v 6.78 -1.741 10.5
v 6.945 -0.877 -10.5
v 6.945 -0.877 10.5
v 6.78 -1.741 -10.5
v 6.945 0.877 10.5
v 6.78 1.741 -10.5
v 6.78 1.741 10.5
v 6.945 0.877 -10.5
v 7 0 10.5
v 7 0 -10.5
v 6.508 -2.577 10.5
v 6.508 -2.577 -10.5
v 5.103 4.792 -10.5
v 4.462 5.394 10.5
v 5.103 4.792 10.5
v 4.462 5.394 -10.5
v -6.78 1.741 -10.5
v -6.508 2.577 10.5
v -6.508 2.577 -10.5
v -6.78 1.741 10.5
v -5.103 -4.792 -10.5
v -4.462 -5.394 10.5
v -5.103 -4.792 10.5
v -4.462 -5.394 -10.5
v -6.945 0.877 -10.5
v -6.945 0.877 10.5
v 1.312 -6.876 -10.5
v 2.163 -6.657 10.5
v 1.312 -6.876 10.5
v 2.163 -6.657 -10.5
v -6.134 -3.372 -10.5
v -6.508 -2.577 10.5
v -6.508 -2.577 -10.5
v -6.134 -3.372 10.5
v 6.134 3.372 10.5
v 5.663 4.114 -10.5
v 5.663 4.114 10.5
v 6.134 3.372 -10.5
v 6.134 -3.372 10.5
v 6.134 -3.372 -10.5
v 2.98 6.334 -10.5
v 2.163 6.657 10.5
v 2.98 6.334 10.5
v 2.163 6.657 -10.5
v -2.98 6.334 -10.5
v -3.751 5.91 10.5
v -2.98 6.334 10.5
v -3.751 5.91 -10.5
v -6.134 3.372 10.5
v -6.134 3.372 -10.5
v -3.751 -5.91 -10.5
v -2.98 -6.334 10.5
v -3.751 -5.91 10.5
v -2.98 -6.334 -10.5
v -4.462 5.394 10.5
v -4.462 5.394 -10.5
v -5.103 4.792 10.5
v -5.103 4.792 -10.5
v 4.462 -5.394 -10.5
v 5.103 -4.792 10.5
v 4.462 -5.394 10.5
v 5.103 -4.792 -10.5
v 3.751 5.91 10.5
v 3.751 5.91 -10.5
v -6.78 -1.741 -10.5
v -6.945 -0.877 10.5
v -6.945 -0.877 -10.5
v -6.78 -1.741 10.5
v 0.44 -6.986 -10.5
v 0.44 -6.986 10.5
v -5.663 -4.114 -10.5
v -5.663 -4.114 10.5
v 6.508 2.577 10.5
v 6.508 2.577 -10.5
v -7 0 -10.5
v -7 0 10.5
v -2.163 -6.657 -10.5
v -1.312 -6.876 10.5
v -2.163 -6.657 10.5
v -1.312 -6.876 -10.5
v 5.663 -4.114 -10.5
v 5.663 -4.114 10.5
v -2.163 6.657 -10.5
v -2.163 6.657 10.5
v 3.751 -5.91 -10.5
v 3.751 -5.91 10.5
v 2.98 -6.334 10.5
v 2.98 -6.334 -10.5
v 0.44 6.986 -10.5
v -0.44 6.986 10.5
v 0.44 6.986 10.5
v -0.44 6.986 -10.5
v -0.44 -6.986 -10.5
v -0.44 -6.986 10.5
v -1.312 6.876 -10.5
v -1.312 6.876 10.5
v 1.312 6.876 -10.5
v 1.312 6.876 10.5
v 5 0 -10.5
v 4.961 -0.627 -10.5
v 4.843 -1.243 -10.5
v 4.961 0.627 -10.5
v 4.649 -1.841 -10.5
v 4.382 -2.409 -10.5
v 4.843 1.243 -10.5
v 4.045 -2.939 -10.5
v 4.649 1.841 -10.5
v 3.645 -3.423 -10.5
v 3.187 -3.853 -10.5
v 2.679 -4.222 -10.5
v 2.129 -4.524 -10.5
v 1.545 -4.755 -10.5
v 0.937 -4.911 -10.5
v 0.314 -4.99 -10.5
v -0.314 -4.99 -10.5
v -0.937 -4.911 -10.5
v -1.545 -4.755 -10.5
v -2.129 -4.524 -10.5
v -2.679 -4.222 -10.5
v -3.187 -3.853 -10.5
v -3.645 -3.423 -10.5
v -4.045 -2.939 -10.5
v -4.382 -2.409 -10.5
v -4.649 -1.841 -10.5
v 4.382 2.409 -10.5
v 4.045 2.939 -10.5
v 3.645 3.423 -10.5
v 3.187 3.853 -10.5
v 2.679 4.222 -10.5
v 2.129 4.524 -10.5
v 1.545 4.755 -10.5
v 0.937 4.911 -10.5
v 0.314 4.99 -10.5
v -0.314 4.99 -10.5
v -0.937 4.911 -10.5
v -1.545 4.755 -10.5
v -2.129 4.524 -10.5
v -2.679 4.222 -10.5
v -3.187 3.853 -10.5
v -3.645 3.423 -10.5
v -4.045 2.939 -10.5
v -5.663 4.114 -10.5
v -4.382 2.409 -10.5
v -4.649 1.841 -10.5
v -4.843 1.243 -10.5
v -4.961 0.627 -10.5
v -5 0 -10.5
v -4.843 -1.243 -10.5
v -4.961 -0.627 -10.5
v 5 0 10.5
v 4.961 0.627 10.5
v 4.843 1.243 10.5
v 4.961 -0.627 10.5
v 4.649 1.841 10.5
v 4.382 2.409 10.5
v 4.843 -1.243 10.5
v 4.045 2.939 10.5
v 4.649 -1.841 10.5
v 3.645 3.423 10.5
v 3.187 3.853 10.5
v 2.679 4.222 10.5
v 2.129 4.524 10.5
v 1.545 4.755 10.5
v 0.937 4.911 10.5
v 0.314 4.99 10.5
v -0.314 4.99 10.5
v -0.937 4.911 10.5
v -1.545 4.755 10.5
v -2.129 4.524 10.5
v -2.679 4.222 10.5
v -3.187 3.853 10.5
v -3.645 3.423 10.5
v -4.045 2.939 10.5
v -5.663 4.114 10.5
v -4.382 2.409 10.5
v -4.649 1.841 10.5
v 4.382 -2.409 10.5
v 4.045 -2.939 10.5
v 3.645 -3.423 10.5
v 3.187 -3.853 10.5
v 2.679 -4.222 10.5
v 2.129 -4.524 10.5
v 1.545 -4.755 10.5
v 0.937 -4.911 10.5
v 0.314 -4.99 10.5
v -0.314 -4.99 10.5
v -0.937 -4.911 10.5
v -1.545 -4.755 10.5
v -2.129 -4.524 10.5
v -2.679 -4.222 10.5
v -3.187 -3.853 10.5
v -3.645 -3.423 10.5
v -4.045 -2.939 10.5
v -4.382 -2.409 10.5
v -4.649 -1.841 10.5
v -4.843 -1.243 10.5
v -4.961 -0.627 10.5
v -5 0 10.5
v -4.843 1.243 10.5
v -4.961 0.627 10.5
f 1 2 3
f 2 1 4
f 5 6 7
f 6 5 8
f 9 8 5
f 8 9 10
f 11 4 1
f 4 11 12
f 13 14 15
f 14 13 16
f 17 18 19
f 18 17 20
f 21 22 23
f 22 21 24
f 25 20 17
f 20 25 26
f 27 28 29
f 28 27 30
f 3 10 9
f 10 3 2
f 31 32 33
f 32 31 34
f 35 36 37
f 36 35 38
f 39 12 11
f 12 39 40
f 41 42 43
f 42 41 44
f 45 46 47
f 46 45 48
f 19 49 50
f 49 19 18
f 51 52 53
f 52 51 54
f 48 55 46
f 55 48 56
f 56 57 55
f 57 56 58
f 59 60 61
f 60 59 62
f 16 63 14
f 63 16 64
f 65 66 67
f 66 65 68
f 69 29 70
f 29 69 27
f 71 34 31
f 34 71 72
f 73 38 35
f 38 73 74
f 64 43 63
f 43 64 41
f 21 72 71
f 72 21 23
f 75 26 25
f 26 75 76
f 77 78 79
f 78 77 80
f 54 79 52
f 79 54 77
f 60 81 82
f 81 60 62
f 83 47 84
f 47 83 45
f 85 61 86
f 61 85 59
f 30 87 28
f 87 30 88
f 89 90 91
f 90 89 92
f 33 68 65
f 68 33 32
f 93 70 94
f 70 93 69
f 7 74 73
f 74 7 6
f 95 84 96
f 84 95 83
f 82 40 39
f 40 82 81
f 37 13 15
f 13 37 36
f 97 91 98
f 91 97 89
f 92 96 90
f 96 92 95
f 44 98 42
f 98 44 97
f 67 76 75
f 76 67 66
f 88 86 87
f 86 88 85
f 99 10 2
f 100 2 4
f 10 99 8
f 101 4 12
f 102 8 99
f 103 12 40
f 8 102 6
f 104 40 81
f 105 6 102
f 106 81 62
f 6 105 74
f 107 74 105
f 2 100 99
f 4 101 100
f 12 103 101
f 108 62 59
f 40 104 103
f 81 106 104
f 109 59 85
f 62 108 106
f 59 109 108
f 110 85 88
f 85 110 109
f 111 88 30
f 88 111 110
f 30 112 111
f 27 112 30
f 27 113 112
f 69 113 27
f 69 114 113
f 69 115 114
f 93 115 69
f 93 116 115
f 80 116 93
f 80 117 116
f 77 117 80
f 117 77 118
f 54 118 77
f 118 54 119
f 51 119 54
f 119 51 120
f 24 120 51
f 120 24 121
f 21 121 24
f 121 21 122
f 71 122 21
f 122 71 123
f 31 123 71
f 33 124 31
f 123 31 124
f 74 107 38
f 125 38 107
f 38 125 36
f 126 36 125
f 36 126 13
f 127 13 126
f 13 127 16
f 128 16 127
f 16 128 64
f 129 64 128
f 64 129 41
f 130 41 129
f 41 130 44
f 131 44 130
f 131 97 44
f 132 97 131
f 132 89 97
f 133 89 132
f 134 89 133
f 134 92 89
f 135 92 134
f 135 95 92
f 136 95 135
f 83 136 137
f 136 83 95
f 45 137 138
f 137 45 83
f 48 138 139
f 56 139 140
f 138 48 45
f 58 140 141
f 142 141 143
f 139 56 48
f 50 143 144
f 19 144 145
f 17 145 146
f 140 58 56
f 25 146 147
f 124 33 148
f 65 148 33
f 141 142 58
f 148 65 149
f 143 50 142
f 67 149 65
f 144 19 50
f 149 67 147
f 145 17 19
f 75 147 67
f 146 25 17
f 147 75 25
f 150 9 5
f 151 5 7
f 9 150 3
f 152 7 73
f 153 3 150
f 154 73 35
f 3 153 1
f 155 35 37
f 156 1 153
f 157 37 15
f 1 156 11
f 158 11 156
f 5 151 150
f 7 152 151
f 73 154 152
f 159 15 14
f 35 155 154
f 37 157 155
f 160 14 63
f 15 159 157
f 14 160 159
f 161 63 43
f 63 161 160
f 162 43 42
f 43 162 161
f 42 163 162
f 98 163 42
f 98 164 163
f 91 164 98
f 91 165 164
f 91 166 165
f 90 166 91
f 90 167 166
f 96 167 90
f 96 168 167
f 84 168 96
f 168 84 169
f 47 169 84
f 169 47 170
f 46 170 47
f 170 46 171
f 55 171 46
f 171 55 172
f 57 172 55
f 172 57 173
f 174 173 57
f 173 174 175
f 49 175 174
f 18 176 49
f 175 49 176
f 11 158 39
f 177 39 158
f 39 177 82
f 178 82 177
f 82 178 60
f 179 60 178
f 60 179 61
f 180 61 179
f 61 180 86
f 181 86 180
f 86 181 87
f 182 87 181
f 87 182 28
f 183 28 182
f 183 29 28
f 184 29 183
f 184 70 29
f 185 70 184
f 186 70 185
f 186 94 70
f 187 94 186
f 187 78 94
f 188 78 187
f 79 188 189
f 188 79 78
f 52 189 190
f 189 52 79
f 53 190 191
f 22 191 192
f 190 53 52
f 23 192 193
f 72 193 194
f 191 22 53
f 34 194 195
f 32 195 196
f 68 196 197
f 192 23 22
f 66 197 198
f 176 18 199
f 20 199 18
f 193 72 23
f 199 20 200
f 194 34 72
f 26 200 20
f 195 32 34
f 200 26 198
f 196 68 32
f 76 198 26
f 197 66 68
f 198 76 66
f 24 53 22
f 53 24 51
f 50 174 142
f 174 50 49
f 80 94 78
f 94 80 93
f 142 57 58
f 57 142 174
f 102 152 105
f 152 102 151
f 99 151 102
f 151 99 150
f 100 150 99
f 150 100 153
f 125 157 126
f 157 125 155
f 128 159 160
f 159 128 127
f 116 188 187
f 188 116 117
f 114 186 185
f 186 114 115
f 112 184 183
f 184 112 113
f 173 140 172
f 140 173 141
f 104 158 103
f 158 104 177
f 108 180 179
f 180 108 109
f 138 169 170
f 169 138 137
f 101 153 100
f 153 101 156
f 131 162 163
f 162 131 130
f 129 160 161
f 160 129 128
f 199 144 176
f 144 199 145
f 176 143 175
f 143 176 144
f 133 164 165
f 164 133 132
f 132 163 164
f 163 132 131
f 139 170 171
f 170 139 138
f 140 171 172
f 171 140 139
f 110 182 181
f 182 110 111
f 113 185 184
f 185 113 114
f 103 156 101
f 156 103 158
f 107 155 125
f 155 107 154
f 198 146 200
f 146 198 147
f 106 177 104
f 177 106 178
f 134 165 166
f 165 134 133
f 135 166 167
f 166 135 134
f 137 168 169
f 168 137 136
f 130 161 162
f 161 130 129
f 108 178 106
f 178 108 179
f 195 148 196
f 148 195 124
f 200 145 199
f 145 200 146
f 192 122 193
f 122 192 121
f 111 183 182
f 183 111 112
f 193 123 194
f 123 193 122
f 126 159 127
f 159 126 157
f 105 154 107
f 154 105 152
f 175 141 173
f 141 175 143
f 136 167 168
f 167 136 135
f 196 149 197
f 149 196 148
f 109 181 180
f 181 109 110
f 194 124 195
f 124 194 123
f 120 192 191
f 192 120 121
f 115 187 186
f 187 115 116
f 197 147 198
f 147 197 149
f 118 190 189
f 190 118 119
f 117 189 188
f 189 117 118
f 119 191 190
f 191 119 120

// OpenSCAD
$fn = 50;


difference() {
	union() {
		translate(v = [0, 0, -10.5000000000]) {
			cylinder(h = 21, r = 7.0000000000);
		}
	}
	union() {
		translate(v = [0, 0, -100.0000000000]) {
			cylinder(h = 200, r = 5.0000000000);
		}
	}
}
